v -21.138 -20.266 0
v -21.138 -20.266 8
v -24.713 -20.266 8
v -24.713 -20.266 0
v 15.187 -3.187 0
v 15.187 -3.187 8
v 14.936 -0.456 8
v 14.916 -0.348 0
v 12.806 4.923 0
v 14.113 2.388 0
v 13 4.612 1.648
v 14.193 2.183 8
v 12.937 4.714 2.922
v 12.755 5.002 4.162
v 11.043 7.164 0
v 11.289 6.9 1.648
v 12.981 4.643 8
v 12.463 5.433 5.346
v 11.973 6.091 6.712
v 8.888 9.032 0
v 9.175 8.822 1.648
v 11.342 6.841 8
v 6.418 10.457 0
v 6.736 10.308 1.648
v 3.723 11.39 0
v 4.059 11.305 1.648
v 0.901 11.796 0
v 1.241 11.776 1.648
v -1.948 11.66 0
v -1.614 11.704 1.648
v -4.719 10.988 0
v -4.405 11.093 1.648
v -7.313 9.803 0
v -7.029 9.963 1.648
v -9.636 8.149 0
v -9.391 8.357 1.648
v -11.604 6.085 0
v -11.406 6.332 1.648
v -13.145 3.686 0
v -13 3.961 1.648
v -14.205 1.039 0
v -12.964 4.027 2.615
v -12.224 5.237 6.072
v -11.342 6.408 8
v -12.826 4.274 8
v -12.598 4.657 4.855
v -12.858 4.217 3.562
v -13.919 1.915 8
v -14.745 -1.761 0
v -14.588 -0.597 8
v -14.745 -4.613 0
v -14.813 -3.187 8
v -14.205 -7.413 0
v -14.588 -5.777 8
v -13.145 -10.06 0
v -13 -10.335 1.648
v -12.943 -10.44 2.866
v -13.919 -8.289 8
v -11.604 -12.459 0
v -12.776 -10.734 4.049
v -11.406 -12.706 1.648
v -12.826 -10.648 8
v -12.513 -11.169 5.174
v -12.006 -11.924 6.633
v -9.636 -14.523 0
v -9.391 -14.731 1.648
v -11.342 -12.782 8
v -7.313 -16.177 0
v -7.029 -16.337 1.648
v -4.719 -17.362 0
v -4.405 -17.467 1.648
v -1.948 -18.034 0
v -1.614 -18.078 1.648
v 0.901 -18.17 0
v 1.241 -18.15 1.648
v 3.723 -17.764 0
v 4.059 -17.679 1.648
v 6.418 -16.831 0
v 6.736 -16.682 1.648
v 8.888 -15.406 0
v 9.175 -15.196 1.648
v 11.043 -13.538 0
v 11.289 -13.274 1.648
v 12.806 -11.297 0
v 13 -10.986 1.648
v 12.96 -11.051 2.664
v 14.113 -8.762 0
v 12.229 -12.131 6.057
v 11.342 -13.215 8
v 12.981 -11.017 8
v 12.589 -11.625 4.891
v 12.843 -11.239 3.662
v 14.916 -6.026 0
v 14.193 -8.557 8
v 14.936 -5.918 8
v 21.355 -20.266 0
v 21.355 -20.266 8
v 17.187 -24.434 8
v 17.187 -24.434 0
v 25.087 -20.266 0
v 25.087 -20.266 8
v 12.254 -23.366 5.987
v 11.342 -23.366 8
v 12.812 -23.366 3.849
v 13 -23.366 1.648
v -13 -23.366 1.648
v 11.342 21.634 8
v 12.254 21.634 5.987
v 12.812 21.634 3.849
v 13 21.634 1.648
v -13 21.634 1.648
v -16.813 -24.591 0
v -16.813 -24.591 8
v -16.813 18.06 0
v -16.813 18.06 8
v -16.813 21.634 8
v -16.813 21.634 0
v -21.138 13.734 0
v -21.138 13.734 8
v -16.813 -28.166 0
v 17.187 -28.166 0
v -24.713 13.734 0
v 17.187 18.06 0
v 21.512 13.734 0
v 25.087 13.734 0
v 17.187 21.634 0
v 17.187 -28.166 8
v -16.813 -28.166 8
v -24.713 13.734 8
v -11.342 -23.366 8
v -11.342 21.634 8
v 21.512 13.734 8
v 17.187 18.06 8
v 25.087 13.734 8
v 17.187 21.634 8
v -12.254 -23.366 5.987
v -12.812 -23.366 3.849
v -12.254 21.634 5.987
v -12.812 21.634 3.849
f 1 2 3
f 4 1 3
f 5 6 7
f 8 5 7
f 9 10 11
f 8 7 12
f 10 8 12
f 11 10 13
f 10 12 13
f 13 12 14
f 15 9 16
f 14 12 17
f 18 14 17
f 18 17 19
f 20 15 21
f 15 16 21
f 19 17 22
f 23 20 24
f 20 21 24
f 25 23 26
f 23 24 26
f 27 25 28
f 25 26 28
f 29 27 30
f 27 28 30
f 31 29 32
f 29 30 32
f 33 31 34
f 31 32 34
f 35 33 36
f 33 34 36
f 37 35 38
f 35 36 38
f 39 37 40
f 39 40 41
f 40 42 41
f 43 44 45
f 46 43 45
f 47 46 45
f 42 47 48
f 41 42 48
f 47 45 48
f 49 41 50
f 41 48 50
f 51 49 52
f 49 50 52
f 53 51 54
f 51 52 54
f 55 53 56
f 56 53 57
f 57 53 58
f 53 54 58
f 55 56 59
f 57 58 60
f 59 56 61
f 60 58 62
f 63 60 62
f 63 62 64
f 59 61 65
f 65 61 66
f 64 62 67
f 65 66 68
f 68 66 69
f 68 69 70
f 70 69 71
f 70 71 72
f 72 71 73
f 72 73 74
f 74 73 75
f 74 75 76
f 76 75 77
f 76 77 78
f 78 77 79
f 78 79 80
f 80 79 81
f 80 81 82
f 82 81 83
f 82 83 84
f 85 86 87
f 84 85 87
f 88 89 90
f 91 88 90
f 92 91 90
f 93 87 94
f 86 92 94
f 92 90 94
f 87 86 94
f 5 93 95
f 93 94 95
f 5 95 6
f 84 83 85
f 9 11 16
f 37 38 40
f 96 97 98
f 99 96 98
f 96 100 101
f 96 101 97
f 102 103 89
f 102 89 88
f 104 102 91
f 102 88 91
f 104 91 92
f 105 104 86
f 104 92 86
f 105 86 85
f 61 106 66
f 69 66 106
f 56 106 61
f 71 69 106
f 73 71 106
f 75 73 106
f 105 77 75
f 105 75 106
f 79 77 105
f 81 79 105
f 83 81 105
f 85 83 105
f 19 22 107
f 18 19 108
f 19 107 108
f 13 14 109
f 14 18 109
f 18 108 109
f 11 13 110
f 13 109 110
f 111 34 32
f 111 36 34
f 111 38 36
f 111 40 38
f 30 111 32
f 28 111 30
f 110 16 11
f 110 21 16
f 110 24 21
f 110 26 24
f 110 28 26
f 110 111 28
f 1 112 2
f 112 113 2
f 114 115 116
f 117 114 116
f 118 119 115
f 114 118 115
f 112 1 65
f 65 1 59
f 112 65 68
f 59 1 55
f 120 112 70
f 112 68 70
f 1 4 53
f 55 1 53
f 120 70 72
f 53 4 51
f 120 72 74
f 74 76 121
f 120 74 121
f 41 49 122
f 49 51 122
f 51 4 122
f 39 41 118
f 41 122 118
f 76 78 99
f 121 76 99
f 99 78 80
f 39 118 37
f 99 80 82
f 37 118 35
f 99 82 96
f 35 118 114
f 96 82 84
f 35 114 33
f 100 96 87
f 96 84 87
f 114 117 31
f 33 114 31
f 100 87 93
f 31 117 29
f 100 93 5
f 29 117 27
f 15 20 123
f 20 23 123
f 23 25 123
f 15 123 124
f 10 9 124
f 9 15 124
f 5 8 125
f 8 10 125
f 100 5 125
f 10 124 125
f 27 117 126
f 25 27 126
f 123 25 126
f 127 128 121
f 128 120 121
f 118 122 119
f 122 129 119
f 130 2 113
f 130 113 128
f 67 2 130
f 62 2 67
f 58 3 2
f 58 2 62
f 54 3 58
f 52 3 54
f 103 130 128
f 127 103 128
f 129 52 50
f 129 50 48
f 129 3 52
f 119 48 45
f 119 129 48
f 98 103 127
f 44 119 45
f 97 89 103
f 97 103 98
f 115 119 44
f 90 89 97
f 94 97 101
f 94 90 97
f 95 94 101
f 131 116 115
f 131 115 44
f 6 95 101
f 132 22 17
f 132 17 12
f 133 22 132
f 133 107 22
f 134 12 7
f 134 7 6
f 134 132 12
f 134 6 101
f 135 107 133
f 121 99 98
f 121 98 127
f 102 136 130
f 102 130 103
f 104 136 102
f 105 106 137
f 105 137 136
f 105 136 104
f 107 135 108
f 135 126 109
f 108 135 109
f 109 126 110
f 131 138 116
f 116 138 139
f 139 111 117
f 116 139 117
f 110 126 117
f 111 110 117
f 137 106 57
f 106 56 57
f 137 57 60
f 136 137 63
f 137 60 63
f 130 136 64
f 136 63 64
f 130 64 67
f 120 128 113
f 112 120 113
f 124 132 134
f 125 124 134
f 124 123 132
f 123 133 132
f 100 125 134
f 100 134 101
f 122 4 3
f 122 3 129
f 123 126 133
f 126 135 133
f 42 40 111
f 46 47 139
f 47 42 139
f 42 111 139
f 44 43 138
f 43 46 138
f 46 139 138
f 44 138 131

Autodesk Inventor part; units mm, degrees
ref_plane "YZ Plane" through (0, 0, 0) normal (1, 0, 0) x (0, 1, 0)
ref_plane "XZ Plane" through (0, 0, 0) normal (0, 1, 0) x (-1, 0, 0)
ref_plane "XY Plane" through (0, 0, 0) normal (0, 0, 1) x (1, 0, 0)
sketch "Sketch1" plane through (0, 0, 0) normal (0, 0, 1) x (1, 0, 0)
  line L0 (21.5871, 13.6345) -> (17.0871, 18.1345) projected
  line L1 (17.0871, 18.1345) -> (-16.7129, 18.1345) projected
  line L2 (-16.7129, 18.1345) -> (-21.2129, 13.6345) projected
  line L3 (-21.0966, 13.6345) -> (-21.0966, -20.1655) projected
  line L4 (21.4709, -20.1655) -> (21.4709, 13.6345) projected
  line L5 (21.4709, -20.1655) -> (17.0871, -24.4078) projected
  line L6 (-16.7129, -24.4078) -> (17.0871, -24.4078) projected
  line L7 (-16.7129, -24.4078) -> (-21.0966, -20.1655) projected
  line L8 (-24.7129, -28.1655) -> (-24.7129, 13.6345) construction
  line L9 (25.0871, -28.1655) -> (-24.7129, -28.1655) construction
  line L10 (25.0871, -28.1655) -> (25.0871, 13.6345) construction
  line L11 (17.0871, 21.6345) -> (-16.7129, 21.6345) construction
  line L12 (-21.0552, -20.0655) -> (-16.6129, -24.5078)
  line L13 (-16.6129, -24.5078) -> (-16.6129, -28.1655)
  line L14 (-16.6129, -28.1655) -> (17.0871, -28.1655)
  line L15 (25.0871, -20.0655) -> (21.4295, -20.0655)
  line L16 (25.0871, 13.5345) -> (25.0871, -20.0655)
  line L17 (21.4295, 13.5345) -> (25.0871, 13.5345)
  line L18 (21.4295, 13.5345) -> (16.9871, 17.9768)
  line L19 (16.9871, 17.9768) -> (16.9871, 21.6345)
  line L20 (16.9871, 21.6345) -> (-16.6129, 21.6345)
  line L21 (-16.6129, 21.6345) -> (-16.6129, 17.9768)
  line L22 (-16.6129, 17.9768) -> (-21.0552, 13.5345)
  line L23 (-24.7129, 13.5345) -> (-21.0552, 13.5345)
  line L24 (-24.7129, -20.0655) -> (-24.7129, 13.5345)
  line L25 (-21.0552, -20.0655) -> (-24.7129, -20.0655)
  line L26 (-12.3129, -23.2655) -> (12.6871, -23.2655) projected
  line L27 (12.6871, -23.2655) -> (12.6871, 16.7345) projected
  line L28 (-12.3129, 16.7345) -> (12.6871, 16.7345) projected
  line L29 (-12.3129, -23.2655) -> (-12.3129, 16.7345) projected
  line L30 (14.6871, -25.2655) -> (-14.3129, -25.2655) construction
  line L31 (-14.3129, -25.2655) -> (-14.3129, 18.7345) construction
  line L32 (-14.3129, 18.7345) -> (14.6871, 18.7345) construction
  line L33 (14.6871, 18.7345) -> (14.6871, -25.2655) construction
  line L34 (-17.3129, 21.7345) -> (17.6871, 21.7345) construction
  line L35 (17.6871, 21.7345) -> (17.6871, -28.2655) construction
  line L36 (17.6871, -28.2655) -> (-17.3129, -28.2655) construction
  line L37 (-17.3129, -28.2655) -> (-17.3129, 21.7345) construction
  line L38 (-14.3129, -23.2655) -> (-14.3129, -25.2655)
  line L39 (-14.3129, -25.2655) -> (14.6871, -25.2655)
  line L40 (14.6871, -25.2655) -> (14.6871, -20.0655)
  line L41 (14.6871, -20.0655) -> (17.6871, -20.0655)
  line L42 (17.6871, -20.0655) -> (17.6871, 13.5345)
  line L43 (17.6871, 13.5345) -> (14.6871, 13.5345)
  line L44 (14.6871, 13.5345) -> (14.6871, 18.7345)
  line L45 (14.6871, 18.7345) -> (-14.3129, 18.7345)
  line L46 (-14.3129, 18.7345) -> (-14.3129, 13.5345)
  line L47 (-14.3129, 13.5345) -> (-17.3129, 13.5345)
  line L48 (-17.3129, 13.5345) -> (-17.3129, -20.0655)
  line L49 (-17.3129, -20.0655) -> (-14.3129, -20.0655)
  line L50 (-14.3129, -20.0655) -> (-14.3129, -23.2655)
  line L51 (-16.6129, -28.1655) -> (17.0871, -28.1655)
  line L52 (16.9871, -28.1655) -> (16.9871, -24.3509)
  line L53 (16.9871, -24.3509) -> (21.2726, -20.0655)
  line L54 (21.2726, -20.0655) -> (21.4295, -20.0655)
  point P0 (14.2, -44.8454)
  point P1 (16.9871, 19.8057)
  dimension "d74" = 2
  dimension "d75" = 5
  dimension "d76" = 135
extrude "Extrusion1" add sketch "Sketch1" along normal blind 8 contours L19 L18 L17 L4 L15 L54 L53 L52 L6 L40 L41 L42 L43 L44 L1 | L1 L44 L45 L46 L21 L20 L19 | L44 L43 L42 L41 L40 L6 L38 L50 L49 L48 L47 L46 L1 | L1 L46 L45 L44 | L46 L47 L48 L49 L50 L38 L6 L12 L25 L3 L23 L22 L21 L1 | L17 L16 L15 L4 | L3 L25 L24 L23 | L40 L39 L38 L6 | L6 L52 L14 L13 L12 L38 L39 L40 | L29 L28 L27 L26
sketch "Skizze7" plane through (0, 0, 8) normal (0, 0, 1) x (1, 0, 0)
  line L0 (-21.0552, -20.0655) -> (-16.6129, -24.5078) projected
  line L1 (-16.6129, -24.5078) -> (-16.6129, -28.1655) projected
  line L2 (-16.6129, -28.1655) -> (16.9871, -28.1655) construction
  line L3 (16.9871, -28.1655) -> (16.9871, -24.3509) projected
  line L4 (16.9871, -24.3509) -> (21.2726, -20.0655) projected
  line L5 (21.2726, -20.0655) -> (25.0871, -20.0655) projected
  line L6 (25.0871, -20.0655) -> (25.0871, 13.5345) construction
  line L7 (25.0871, 13.5345) -> (21.4295, 13.5345) projected
  line L8 (21.4295, 13.5345) -> (16.9871, 17.9768) projected
  line L9 (16.9871, 17.9768) -> (16.9871, 21.6345) projected
  line L10 (16.9871, 21.6345) -> (-16.6129, 21.6345) construction
  line L11 (-16.6129, 21.6345) -> (-16.6129, 17.9768) projected
  line L12 (-16.6129, 17.9768) -> (-21.0552, 13.5345) projected
  line L13 (-21.0552, 13.5345) -> (-24.7129, 13.5345) projected
  line L14 (-24.7129, 13.5345) -> (-24.7129, -20.0655) construction
  line L15 (-24.7129, -20.0655) -> (-21.0552, -20.0655) projected
  line L16 (-16.8129, 21.8345) -> (17.1871, 21.8345) construction
  line L17 (17.1871, 21.8345) -> (17.1871, 18.0597)
  line L18 (17.1871, 18.0597) -> (21.5123, 13.7345)
  line L19 (21.5123, 13.7345) -> (25.2871, 13.7345)
  line L20 (25.2871, 13.7345) -> (25.2871, -20.2655) construction
  line L21 (25.2871, -20.2655) -> (21.3554, -20.2655)
  line L22 (21.3554, -20.2655) -> (17.1871, -24.4338)
  line L23 (17.1871, -24.4338) -> (17.1871, -28.3655)
  line L24 (17.1871, -28.3655) -> (-16.8129, -28.3655) construction
  line L25 (-16.8129, -28.3655) -> (-16.8129, -24.5907)
  line L26 (-16.8129, -24.5907) -> (-21.1381, -20.2655)
  line L27 (-21.1381, -20.2655) -> (-24.9129, -20.2655)
  line L28 (-24.9129, -20.2655) -> (-24.9129, 13.7345) construction
  line L29 (-24.9129, 13.7345) -> (-21.1381, 13.7345)
  line L30 (-21.1381, 13.7345) -> (-16.8129, 18.0597)
  line L31 (-16.8129, 18.0597) -> (-16.8129, 21.8345)
  line L32 (-21.0552, 13.5345) -> (-24.7129, 13.5345) projected
  line L33 (-24.7129, 13.5345) -> (-24.7129, 13.7345)
  line L34 (-16.6129, 21.6345) -> (-16.6129, 17.9768) projected
  line L35 (-16.6129, 21.6345) -> (-16.8129, 21.6345)
  line L36 (25.0871, -20.0655) -> (25.0871, 13.5345) projected
  line L37 (25.0871, 13.5345) -> (25.0871, 13.7345)
  line L38 (16.9871, 21.6345) -> (17.1871, 21.6345)
  line L39 (16.9871, -28.1655) -> (17.1871, -28.1655)
  line L40 (25.0871, -20.0655) -> (25.0871, -20.2655)
  line L41 (-16.6129, -28.1655) -> (-16.8129, -28.1655)
  line L42 (-24.7129, -20.0655) -> (-24.7129, -20.2655)
  dimension "d94" = 0.2
extrude "IM_offset" add sketch "Skizze7" against normal up to surface (8 mm away)
sketch "Sketch8" plane through (-16.8129, 21.6345, 0) normal (0, 1, 0) x (1, 0, 0)
  line L0 (0, 0) -> (34, 0) projected
  line L1 (34, -8) -> (0, -8) projected
  line L2 (3.8129, -1.6478) -> (29.8129, -1.6478)
  arc A0 (3.8129, -1.6478) -> (29.8129, -1.6478) centre (16.8129, -1.6478) ccw
  line L3 (0, -8) -> (0, 0) projected
  line L4 (34, -8) -> (34, 0) projected
  point P0 (16.8129, 0)
  dimension "d86" = 26
  dimension "d88" = 0
extrude "Extrusion7" cut sketch "Sketch8" against normal blind 45 contours A0 L2 L1 | L1 A0
sketch "Sketch9" plane through (0, 0, 8) normal (0, 0, 1) x (1, 0, 0)
  line L0 (-11.3424, 21.6345) -> (-16.8129, 21.6345) projected
  line L1 (-24.7129, 13.7345) -> (-24.7129, -20.2655) projected
  line L2 (17.1871, -28.1655) -> (-16.8129, -28.1655) projected
  line L3 (25.0871, -20.0655) -> (25.0871, 13.7345) projected
  circle A0 centre (0.1871, -3.187) radius 27.0445
  circle A1 centre (0.1871, -3.187) radius 15
  line L4 (11.3424, 21.6345) -> (11.3424, -23.3655) projected
  line L5 (11.3424, -23.3655) -> (-11.3424, -23.3655) projected
  line L6 (-11.3424, -23.3655) -> (-11.3424, 21.6345) projected
  line L7 (17.1871, 21.6345) -> (11.3424, 21.6345) projected
  line L8 (-16.8129, 21.6345) -> (-16.8129, 18.0597) projected
  line L9 (-16.8129, 18.0597) -> (-21.1381, 13.7345) projected
  line L10 (-21.1381, 13.7345) -> (-24.7129, 13.7345) projected
  line L11 (17.1871, -28.1655) -> (17.1871, -24.4338) projected
  line L12 (17.1871, -24.4338) -> (21.3554, -20.2655) projected
  line L13 (21.3554, -20.2655) -> (25.0871, -20.2655) projected
  line L14 (25.0871, -20.2655) -> (25.0871, -20.0655) projected
  line L15 (25.0871, 13.7345) -> (21.5123, 13.7345) projected
  line L16 (21.5123, 13.7345) -> (17.1871, 18.0597) projected
  line L17 (17.1871, 18.0597) -> (17.1871, 21.6345) projected
  line L18 (-21.1381, -20.2655) -> (-24.7129, -20.2655) projected
  line L19 (-16.8129, -24.5907) -> (-21.1381, -20.2655) projected
  line L20 (-16.8129, -28.1655) -> (-16.8129, -24.5907) projected
  point P0 (0, 0)
  dimension "d91" = 30
extrude "Extrusion8" cut sketch "Sketch9" against normal through all contours L6 A1 | A1 L4 L6 | A1 L4
properties part number "20_Cube_Insert_Lens_Cylindrical_v3"
